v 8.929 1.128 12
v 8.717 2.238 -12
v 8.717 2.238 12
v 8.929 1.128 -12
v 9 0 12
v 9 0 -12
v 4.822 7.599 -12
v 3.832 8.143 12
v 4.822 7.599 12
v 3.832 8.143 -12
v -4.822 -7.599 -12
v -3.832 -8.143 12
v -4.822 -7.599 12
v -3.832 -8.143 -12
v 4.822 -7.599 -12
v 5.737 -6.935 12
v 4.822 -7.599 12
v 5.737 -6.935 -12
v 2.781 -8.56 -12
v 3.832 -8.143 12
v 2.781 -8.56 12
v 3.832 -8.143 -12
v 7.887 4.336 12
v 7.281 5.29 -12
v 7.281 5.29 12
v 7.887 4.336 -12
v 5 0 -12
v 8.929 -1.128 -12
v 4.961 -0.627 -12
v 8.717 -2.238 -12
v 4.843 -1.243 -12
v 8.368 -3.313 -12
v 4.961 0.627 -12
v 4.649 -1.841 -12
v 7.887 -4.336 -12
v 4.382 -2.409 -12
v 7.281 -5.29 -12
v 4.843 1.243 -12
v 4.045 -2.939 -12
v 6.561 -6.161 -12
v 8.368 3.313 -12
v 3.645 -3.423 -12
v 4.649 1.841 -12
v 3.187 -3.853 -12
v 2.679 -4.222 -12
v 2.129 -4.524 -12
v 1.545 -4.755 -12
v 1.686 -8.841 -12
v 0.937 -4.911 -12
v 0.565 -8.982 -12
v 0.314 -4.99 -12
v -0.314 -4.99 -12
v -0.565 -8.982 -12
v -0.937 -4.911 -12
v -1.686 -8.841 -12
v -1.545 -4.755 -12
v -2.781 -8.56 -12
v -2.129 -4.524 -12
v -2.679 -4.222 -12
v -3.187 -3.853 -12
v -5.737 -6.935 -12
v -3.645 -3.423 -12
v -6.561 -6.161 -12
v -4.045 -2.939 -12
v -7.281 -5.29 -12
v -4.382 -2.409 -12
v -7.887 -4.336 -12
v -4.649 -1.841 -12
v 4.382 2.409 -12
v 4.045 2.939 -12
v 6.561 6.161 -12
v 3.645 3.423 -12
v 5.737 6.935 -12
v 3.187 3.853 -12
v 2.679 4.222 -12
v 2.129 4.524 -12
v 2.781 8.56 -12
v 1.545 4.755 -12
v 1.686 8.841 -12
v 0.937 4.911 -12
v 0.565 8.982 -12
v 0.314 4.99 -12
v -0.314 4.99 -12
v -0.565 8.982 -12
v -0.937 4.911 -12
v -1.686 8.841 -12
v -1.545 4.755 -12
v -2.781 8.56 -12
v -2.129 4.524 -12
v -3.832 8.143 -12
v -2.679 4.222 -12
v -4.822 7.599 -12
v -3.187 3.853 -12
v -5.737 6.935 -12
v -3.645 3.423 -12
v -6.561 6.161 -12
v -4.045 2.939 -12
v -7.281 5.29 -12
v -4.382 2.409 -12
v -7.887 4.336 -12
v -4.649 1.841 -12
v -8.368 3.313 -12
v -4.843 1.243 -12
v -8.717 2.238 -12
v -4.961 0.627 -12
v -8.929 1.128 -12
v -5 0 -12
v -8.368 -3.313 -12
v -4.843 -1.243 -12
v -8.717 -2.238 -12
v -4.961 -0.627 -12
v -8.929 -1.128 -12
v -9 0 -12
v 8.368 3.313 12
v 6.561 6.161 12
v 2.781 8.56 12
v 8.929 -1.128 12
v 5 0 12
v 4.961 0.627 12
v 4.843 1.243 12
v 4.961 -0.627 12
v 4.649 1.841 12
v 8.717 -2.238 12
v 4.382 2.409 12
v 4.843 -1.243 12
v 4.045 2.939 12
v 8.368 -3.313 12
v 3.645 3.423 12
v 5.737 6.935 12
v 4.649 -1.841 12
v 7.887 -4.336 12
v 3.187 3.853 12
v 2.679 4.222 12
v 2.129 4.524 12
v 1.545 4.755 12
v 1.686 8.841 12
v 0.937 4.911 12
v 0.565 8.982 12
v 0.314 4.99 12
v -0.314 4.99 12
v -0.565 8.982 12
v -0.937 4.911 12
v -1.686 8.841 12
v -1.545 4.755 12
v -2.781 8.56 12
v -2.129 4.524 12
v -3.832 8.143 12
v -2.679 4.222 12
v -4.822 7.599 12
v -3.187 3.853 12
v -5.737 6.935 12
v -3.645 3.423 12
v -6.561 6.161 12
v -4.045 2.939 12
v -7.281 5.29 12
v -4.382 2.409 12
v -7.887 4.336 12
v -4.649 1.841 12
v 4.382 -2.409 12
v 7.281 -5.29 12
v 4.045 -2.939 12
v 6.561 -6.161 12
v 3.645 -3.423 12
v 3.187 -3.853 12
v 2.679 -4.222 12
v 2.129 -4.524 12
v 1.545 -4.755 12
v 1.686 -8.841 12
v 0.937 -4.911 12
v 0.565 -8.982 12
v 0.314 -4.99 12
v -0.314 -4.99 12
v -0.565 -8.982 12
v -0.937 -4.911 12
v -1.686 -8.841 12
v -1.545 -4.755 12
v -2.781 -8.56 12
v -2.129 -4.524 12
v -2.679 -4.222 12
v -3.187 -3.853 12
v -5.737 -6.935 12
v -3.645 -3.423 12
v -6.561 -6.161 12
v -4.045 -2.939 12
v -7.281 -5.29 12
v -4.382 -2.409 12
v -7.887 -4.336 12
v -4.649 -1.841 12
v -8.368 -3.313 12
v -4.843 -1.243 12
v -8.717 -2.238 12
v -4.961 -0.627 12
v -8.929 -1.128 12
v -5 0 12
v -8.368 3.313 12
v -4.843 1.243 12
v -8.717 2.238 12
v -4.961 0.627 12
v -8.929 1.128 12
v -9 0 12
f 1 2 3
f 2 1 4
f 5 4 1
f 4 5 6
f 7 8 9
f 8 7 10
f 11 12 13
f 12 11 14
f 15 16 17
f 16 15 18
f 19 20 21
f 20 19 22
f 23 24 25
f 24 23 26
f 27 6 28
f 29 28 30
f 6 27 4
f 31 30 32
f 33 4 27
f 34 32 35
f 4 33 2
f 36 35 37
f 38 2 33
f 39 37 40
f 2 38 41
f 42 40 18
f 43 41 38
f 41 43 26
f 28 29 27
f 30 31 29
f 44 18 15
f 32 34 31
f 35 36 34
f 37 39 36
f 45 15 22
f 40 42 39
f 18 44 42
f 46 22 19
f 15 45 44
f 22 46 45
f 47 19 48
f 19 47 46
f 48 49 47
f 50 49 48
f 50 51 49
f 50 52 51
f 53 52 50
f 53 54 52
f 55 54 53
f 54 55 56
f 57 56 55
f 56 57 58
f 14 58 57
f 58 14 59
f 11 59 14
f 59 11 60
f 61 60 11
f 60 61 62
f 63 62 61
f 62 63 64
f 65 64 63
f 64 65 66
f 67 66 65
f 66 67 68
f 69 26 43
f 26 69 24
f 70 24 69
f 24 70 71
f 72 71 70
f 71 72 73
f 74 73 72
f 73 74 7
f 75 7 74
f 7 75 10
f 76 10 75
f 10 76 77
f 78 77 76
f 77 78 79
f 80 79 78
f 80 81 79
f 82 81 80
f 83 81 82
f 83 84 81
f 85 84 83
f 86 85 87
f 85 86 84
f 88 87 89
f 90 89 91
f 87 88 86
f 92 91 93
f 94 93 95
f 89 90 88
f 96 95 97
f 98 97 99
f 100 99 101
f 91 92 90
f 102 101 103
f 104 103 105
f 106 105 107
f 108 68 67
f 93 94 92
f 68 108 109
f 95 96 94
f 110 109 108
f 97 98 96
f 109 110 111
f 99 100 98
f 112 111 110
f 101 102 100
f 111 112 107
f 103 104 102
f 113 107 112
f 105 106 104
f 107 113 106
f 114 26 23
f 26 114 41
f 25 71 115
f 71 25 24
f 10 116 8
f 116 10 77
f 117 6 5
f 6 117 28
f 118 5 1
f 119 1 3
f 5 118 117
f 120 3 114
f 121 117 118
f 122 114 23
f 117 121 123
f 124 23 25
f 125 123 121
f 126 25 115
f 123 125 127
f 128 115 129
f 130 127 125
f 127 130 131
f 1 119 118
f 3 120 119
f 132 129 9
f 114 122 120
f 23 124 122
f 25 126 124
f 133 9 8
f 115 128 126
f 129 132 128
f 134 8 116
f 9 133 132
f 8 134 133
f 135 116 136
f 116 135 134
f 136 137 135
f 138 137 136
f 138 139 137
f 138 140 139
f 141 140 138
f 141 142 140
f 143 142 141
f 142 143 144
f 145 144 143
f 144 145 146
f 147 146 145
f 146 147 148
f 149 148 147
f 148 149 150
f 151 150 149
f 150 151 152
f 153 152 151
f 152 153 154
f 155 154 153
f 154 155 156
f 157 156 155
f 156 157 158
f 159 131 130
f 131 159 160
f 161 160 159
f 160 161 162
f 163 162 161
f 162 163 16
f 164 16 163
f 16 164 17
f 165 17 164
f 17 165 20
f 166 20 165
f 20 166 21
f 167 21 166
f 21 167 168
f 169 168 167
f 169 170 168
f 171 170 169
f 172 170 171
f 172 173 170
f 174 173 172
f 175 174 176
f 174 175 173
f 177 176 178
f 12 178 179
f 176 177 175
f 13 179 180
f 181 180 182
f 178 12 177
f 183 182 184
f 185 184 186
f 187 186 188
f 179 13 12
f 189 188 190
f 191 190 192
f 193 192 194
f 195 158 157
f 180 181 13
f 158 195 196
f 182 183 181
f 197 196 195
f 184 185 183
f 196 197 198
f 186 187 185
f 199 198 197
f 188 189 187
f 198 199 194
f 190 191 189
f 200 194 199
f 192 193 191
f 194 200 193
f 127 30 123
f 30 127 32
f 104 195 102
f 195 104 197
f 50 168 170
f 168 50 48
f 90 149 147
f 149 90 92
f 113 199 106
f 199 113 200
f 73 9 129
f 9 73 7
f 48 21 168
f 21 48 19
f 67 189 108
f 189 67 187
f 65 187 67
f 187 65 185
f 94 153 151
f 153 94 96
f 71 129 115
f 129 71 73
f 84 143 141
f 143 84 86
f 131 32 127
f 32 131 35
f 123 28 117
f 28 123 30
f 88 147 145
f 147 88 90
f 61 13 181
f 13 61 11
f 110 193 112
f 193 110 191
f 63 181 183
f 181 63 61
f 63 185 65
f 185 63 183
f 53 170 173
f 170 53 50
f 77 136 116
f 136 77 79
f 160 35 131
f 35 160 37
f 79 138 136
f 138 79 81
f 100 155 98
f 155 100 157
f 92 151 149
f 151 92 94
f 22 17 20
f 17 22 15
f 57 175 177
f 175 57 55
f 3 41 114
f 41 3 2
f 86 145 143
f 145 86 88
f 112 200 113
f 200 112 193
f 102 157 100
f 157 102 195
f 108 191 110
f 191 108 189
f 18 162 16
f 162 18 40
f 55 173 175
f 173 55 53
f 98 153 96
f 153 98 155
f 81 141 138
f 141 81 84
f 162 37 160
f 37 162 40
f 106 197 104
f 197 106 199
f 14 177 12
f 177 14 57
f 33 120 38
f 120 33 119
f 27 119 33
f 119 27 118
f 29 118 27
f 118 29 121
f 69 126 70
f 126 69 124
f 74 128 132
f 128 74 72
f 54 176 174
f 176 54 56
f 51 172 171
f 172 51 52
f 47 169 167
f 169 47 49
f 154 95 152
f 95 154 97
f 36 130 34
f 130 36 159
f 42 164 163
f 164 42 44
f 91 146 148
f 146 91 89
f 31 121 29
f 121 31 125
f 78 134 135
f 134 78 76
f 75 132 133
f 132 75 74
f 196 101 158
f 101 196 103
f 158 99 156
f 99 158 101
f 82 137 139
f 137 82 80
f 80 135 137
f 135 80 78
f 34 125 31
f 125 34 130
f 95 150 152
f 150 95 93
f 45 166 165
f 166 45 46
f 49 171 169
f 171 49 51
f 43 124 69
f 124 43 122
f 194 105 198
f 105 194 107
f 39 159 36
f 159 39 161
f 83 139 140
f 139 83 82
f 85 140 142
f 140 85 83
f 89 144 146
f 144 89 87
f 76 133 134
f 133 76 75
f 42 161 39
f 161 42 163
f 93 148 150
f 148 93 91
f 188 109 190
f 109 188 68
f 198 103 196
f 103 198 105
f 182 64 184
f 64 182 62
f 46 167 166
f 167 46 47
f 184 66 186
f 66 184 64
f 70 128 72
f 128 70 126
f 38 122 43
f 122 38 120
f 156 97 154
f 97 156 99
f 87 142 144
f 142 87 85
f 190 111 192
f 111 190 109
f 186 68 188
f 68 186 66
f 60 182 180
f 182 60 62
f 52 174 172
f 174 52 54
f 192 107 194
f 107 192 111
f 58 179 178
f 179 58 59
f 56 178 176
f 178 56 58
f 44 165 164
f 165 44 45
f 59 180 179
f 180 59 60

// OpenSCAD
$fn = 50;


difference() {
	union() {
		translate(v = [0, 0, -12.0000000000]) {
			cylinder(h = 24, r = 9.0000000000);
		}
	}
	union() {
		translate(v = [0, 0, -100.0000000000]) {
			cylinder(h = 200, r = 5.0000000000);
		}
	}
}
